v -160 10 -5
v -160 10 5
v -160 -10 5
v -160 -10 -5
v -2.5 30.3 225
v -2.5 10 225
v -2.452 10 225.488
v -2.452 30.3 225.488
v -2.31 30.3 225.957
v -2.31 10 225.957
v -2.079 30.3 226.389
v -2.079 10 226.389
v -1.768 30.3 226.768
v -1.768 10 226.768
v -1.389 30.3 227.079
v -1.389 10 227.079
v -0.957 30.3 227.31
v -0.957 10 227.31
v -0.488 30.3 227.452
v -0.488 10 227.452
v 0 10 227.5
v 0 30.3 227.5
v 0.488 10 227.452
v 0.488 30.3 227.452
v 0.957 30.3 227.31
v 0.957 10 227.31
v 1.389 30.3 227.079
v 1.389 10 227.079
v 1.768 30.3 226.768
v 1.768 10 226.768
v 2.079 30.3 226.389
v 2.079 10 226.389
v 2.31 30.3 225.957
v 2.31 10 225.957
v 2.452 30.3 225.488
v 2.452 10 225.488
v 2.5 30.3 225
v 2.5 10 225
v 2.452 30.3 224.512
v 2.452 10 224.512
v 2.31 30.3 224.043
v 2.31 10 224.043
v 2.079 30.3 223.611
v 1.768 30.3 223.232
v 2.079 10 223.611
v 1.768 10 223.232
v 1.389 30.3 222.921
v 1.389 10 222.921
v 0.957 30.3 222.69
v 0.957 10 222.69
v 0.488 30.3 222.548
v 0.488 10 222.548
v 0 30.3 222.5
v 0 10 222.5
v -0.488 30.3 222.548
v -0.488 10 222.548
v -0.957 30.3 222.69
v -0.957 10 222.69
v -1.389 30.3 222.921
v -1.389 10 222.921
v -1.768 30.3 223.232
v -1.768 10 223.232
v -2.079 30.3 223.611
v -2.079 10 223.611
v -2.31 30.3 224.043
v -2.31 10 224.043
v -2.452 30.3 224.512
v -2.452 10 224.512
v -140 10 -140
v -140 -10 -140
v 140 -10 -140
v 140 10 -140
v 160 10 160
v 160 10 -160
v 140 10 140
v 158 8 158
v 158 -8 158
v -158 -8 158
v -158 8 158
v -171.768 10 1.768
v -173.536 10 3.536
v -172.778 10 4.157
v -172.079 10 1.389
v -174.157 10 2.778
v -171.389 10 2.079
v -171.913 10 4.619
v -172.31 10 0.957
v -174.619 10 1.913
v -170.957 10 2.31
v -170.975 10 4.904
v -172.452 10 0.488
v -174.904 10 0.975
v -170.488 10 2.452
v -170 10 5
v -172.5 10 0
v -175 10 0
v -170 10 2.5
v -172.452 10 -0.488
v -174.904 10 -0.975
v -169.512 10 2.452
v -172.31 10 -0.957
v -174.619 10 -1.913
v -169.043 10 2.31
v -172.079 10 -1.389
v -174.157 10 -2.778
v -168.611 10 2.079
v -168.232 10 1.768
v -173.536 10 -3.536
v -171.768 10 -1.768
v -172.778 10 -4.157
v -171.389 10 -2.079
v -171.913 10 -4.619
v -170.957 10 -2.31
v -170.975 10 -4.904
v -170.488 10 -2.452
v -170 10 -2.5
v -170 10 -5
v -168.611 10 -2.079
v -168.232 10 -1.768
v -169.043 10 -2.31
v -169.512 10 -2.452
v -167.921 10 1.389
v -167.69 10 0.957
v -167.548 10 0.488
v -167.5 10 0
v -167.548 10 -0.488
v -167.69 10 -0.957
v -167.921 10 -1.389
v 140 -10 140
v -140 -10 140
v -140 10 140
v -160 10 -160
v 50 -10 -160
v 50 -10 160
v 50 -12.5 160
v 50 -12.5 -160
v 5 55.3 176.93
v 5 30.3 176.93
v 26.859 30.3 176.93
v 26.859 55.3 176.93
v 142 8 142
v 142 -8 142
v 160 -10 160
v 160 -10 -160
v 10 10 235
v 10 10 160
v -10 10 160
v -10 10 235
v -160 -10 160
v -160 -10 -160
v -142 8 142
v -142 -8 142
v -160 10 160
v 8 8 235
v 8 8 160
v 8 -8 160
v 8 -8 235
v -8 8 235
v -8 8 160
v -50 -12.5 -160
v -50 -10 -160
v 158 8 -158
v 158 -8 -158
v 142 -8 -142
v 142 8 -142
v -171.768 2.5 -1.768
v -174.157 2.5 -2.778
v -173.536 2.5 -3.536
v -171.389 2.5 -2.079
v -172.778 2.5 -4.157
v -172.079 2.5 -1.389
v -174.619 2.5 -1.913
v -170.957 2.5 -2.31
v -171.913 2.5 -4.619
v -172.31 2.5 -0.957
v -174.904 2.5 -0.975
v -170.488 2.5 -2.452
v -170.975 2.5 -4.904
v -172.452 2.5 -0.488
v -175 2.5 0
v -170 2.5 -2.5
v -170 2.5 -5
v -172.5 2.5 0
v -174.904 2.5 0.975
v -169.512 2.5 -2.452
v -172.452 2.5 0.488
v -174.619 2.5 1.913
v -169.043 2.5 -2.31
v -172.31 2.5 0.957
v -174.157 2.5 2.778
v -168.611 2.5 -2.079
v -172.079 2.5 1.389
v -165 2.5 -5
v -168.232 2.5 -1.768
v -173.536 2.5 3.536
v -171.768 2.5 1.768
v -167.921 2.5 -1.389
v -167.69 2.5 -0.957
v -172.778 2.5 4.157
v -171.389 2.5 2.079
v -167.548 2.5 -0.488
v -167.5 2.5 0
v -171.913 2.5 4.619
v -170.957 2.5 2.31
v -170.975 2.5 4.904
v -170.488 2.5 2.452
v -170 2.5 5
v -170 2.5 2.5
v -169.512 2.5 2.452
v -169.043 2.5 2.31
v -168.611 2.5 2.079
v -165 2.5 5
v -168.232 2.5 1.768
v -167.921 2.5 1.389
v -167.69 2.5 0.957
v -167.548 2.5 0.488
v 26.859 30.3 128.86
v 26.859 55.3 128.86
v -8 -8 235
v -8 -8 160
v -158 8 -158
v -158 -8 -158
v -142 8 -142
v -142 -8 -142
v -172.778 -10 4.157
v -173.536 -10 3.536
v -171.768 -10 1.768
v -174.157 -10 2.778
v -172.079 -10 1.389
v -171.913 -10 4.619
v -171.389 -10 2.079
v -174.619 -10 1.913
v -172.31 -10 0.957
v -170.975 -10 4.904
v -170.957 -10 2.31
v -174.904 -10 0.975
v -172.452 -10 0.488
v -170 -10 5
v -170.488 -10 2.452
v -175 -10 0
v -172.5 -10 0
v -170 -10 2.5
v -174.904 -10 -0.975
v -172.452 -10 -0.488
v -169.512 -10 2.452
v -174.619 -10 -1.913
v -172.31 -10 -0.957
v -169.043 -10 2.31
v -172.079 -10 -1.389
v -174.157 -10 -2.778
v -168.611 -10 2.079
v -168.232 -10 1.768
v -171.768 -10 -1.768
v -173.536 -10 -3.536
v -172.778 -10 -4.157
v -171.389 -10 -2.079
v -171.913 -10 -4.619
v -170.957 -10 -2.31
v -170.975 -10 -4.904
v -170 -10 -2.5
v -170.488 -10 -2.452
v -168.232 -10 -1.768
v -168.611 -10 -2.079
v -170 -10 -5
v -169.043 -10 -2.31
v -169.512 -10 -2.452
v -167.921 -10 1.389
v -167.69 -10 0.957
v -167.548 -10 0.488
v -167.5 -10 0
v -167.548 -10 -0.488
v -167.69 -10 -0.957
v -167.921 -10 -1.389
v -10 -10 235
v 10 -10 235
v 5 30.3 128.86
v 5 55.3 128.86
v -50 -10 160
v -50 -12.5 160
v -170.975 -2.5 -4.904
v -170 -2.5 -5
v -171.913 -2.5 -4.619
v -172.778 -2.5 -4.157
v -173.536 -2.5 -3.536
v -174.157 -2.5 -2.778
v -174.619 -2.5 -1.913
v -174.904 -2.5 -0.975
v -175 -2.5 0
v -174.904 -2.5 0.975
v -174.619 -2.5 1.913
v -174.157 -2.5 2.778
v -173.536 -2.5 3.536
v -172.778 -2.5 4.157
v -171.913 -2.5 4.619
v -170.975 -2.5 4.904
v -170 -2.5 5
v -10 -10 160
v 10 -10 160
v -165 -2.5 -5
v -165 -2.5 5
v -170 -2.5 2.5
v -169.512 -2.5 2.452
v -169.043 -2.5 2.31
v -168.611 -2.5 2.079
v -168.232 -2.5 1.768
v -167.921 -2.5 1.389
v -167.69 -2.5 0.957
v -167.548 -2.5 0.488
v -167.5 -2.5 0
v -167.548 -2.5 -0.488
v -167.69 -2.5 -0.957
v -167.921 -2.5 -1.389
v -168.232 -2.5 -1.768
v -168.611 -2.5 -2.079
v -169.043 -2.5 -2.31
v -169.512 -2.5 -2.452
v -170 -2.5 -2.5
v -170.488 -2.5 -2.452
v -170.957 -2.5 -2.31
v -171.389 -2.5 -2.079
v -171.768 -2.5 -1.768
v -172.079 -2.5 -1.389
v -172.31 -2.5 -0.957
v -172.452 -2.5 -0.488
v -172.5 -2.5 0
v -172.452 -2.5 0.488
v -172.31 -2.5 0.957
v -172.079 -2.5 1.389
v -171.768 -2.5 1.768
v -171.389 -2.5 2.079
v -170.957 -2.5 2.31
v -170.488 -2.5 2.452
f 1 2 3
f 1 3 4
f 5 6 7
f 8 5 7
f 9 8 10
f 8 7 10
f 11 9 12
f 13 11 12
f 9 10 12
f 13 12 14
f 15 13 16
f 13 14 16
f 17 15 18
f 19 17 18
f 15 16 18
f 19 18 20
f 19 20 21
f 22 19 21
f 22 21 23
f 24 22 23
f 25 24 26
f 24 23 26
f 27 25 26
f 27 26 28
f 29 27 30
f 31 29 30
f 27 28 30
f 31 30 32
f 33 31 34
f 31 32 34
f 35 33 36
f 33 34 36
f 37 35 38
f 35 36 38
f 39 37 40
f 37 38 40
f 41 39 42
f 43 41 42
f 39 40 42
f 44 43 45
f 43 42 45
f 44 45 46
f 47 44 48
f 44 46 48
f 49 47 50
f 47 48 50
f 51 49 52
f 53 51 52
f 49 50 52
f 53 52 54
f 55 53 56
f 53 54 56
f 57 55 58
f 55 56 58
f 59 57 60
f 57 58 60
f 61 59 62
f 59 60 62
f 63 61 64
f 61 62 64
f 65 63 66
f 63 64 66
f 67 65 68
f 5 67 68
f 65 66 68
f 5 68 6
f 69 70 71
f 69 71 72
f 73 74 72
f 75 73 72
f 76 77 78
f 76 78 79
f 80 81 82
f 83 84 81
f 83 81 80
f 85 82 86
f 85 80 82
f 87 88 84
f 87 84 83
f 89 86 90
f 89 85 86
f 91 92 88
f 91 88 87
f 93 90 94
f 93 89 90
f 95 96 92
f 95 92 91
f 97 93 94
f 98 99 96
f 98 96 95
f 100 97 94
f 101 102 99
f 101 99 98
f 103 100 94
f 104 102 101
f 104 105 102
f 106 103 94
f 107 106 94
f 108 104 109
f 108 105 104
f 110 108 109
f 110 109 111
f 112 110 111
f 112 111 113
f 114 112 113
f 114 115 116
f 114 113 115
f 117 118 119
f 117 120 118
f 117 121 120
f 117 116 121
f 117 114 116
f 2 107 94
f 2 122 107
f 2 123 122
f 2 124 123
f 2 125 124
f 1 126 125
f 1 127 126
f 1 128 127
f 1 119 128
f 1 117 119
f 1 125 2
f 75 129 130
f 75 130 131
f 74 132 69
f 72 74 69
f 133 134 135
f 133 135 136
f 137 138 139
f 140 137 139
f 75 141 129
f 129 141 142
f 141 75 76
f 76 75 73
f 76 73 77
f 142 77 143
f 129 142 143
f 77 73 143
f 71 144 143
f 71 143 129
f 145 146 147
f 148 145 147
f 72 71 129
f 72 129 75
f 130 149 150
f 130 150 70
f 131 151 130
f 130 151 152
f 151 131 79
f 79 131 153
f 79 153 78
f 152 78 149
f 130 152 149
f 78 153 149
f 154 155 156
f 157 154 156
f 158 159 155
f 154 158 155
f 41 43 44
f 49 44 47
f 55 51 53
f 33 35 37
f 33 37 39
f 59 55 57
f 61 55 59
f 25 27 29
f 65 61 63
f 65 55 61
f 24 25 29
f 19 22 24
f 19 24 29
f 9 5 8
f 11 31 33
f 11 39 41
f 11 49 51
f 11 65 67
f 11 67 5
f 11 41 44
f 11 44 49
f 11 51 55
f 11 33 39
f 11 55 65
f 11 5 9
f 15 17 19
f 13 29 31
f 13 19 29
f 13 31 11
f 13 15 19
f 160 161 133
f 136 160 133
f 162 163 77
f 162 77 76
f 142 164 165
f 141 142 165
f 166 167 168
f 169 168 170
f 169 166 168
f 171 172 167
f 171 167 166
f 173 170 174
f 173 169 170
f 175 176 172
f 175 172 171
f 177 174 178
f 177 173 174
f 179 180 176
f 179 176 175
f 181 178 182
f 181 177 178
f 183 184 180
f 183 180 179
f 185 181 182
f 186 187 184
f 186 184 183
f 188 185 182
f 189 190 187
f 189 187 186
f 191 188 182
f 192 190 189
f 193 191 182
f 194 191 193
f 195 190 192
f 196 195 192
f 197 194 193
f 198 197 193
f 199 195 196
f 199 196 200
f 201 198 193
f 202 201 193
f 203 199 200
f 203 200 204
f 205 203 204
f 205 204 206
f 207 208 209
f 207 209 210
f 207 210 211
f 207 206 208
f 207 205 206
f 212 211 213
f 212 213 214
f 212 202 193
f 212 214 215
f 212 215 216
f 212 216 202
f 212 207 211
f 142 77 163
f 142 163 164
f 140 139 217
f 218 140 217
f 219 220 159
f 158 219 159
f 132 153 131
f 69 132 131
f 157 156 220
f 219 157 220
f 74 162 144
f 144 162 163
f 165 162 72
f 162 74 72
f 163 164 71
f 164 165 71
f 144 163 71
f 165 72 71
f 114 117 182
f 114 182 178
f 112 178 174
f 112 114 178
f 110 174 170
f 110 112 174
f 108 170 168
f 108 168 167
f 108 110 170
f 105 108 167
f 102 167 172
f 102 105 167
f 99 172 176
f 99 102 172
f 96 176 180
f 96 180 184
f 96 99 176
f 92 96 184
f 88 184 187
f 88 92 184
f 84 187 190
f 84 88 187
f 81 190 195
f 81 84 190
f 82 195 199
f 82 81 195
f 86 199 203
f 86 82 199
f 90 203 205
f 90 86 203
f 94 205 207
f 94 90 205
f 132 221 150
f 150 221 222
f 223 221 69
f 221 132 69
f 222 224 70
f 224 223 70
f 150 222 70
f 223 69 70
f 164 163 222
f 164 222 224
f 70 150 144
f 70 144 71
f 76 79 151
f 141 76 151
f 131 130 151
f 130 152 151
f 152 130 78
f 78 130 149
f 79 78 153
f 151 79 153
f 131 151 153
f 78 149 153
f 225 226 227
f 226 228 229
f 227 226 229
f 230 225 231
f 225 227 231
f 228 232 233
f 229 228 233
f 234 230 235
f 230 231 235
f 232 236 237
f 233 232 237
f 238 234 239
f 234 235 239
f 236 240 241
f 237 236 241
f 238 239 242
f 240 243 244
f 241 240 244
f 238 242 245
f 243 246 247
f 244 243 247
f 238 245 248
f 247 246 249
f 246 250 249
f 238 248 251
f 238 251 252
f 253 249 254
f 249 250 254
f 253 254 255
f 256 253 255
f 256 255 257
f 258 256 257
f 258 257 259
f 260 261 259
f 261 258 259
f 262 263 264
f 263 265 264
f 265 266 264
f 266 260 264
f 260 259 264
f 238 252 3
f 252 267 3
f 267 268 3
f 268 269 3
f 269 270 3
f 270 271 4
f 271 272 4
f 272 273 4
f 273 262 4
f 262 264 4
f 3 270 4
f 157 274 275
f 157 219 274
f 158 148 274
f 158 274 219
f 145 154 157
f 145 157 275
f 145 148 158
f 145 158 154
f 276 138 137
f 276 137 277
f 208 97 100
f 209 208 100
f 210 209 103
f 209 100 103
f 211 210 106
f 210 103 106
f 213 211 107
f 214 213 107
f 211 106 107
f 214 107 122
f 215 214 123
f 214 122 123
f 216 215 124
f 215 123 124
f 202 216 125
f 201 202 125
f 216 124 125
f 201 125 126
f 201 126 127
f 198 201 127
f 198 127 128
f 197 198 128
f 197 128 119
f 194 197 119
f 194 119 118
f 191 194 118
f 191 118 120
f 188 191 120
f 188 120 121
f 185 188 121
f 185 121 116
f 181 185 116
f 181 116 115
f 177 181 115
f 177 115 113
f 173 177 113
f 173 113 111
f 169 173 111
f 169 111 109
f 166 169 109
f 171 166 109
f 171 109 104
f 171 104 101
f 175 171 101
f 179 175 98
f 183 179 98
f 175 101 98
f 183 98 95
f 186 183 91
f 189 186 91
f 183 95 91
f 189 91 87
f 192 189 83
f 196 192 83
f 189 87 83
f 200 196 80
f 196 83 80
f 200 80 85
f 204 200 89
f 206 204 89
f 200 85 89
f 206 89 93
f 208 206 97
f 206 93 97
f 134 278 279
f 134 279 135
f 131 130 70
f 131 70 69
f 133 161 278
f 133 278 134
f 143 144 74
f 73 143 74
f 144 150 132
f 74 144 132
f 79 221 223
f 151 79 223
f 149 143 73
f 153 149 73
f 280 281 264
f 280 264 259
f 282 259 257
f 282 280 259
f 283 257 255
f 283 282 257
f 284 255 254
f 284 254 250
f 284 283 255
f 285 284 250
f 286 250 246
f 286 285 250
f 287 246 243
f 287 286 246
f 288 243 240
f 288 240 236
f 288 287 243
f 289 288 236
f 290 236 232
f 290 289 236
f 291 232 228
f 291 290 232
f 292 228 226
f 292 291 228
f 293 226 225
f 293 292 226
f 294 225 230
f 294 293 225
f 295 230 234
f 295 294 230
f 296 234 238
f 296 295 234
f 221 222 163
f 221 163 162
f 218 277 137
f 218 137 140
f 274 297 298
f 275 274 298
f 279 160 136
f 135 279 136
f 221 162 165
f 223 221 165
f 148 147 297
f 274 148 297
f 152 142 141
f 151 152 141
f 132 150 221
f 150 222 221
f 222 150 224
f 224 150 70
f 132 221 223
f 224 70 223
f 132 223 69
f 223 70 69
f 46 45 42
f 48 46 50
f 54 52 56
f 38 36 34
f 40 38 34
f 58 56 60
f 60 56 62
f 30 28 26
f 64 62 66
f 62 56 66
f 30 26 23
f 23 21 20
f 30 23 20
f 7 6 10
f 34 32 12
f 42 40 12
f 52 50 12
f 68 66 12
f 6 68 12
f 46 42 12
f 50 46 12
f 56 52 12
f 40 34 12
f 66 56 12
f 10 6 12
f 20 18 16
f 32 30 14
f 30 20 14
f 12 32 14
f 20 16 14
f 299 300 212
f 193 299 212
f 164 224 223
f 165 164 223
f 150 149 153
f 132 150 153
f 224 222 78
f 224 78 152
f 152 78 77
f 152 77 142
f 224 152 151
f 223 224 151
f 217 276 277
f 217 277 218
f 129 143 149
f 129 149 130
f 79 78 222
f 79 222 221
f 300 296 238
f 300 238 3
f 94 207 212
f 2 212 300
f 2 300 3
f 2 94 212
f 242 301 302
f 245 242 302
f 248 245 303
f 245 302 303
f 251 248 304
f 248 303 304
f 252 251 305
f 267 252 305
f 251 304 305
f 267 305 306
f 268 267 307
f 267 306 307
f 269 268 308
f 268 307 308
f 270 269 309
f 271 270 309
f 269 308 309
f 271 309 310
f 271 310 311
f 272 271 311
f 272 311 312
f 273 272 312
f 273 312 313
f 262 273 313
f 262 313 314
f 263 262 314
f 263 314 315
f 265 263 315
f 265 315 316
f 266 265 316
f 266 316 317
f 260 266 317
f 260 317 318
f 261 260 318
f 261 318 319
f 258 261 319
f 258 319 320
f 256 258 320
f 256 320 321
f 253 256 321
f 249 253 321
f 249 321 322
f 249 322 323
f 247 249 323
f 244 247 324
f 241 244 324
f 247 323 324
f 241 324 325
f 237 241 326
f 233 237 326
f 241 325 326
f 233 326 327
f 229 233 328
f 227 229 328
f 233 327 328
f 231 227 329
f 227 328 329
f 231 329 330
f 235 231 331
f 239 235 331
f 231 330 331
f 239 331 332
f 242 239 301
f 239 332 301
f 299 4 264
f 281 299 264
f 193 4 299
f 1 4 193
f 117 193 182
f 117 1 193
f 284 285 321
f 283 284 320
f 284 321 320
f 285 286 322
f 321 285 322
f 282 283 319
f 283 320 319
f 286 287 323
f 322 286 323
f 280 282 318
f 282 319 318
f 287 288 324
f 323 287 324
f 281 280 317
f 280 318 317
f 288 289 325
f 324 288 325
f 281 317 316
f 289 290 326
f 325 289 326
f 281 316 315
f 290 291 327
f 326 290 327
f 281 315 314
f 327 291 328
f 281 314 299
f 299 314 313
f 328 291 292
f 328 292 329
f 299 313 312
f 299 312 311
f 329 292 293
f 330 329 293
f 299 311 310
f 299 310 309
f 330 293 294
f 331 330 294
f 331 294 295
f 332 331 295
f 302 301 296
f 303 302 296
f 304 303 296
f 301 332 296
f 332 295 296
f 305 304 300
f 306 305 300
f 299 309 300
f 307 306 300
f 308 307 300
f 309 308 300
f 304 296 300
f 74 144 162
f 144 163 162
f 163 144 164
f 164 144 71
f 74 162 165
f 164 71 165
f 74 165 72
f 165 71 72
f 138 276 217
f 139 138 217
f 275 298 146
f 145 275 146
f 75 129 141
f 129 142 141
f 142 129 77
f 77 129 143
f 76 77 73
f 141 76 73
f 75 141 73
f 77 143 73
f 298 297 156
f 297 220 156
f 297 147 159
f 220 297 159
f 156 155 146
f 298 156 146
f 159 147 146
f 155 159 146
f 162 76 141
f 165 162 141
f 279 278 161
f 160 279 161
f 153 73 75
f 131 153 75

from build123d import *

# Parameters (mm, degrees)
TUBO_CUADRADO_20_X_20_X_2_2_DEPTH      = 315.142135624
TUBO_CUADRADO_20_X_20_X_2_2_DEPTH_BACK = 15.142135624
SKETCH1_W                              = 20
SKETCH1_H                              = 20
SKETCH1_W_2                            = 16
SKETCH1_H_2                            = 16
SKETCH1_ON_SEGMENT_2_W                 = 20
SKETCH1_ON_SEGMENT_2_H                 = 20
SKETCH1_ON_SEGMENT_2_W_2               = 16
SKETCH1_ON_SEGMENT_2_H_2               = 16
TUBO_CUADRADO_20_X_20_X_2_2_2_DEPTH    = 330.284271247
SKETCH1_ON_SEGMENT_3_W                 = 20
SKETCH1_ON_SEGMENT_3_H                 = 20
SKETCH1_ON_SEGMENT_3_W_2               = 16
SKETCH1_ON_SEGMENT_3_H_2               = 16
TUBO_CUADRADO_20_X_20_X_2_2_3_DEPTH    = 330.284271247
SKETCH1_ON_SEGMENT_4_W                 = 20
SKETCH1_ON_SEGMENT_4_H                 = 20
SKETCH1_ON_SEGMENT_4_W_2               = 16
SKETCH1_ON_SEGMENT_4_H_2               = 16
TUBO_CUADRADO_20_X_20_X_2_2_4_DEPTH    = 330.284271247
CROQUIS3_W                             = 100
CROQUIS3_H                             = 320
SALIENTE_EXTRUIR1_DEPTH                = 2.5
CROQUIS7_R                             = 2.5
SALIENTE_EXTRUIR2_DEPTH                = 20
CROQUIS9_W                             = 12.514211711
CROQUIS9_H                             = 5
CORTAR_EXTRUIR1_DEPTH                  = 33
TUBO_CUADRADO_20_X_20_X_2_4_DEPTH      = 75
CROQUIS12_R                            = 2.5
SALIENTE_EXTRUIR3_DEPTH                = 20.3
CROQUIS13_W                            = 21.859399814
CROQUIS13_H                            = 48.070128995
SALIENTE_EXTRUIR4_DEPTH                = 25


with BuildPart() as part:
    # Sketch1 → Tubo cuadrado 20 X 20 X 2(2) (new, two sides: drawn at the far end of the back side and taken through both)
    with BuildSketch(Plane(origin=(-150, 0, -150), x_dir=(1, 0, 0), z_dir=(0, 0, 1)).offset(-TUBO_CUADRADO_20_X_20_X_2_2_DEPTH_BACK)):
        Rectangle(SKETCH1_W, SKETCH1_H)
        Rectangle(SKETCH1_W_2, SKETCH1_H_2, mode=Mode.SUBTRACT)
    extrude(amount=TUBO_CUADRADO_20_X_20_X_2_2_DEPTH + TUBO_CUADRADO_20_X_20_X_2_2_DEPTH_BACK)

    # Tubo cuadrado 20 X 20 X 2(2) mitre 1
    split(bisect_by=Plane(origin=(-150, 0, -150), x_dir=(0, -1, 0), z_dir=(-0.707106781, 0, 0.707106781)), keep=Keep.TOP)

    # Tubo cuadrado 20 X 20 X 2(2) mitre 2
    split(bisect_by=Plane(origin=(-150, 0, 150), x_dir=(0, -1, 0), z_dir=(-0.707106781, 0, -0.707106781)), keep=Keep.TOP)


with BuildPart() as body_2:
    # Sketch1 on segment 2 (carried to segment 2) → Tubo cuadrado 20 X 20 X 2_2 2 (new body)
    with BuildSketch(Plane(origin=(-165.142135624, 0, 150), x_dir=(0, 0, -1), z_dir=(1, 0, 0))):
        Rectangle(SKETCH1_ON_SEGMENT_2_W, SKETCH1_ON_SEGMENT_2_H)
        Rectangle(SKETCH1_ON_SEGMENT_2_W_2, SKETCH1_ON_SEGMENT_2_H_2, mode=Mode.SUBTRACT)
    extrude(amount=TUBO_CUADRADO_20_X_20_X_2_2_2_DEPTH)

    # Tubo cuadrado 20 X 20 X 2_2 2 mitre 1
    split(bisect_by=Plane(origin=(-150, 0, 150), x_dir=(0, 1, 0), z_dir=(0.707106781, 0, 0.707106781)), keep=Keep.TOP)

    # Tubo cuadrado 20 X 20 X 2_2 2 mitre 2
    split(bisect_by=Plane(origin=(150, 0, 150), x_dir=(0, -1, 0), z_dir=(-0.707106781, 0, 0.707106781)), keep=Keep.TOP)


with BuildPart() as body_3:
    # Sketch1 on segment 3 (carried to segment 3) → Tubo cuadrado 20 X 20 X 2_2 3 (new body)
    with BuildSketch(Plane(origin=(150, 0, 165.142135624), x_dir=(-1, 0, 0), z_dir=(0, 0, -1))):
        Rectangle(SKETCH1_ON_SEGMENT_3_W, SKETCH1_ON_SEGMENT_3_H)
        Rectangle(SKETCH1_ON_SEGMENT_3_W_2, SKETCH1_ON_SEGMENT_3_H_2, mode=Mode.SUBTRACT)
    extrude(amount=TUBO_CUADRADO_20_X_20_X_2_2_3_DEPTH)

    # Tubo cuadrado 20 X 20 X 2_2 3 mitre 1
    split(bisect_by=Plane(origin=(150, 0, -150), x_dir=(0, 1, 0), z_dir=(0.707106781, 0, 0.707106781)), keep=Keep.TOP)

    # Tubo cuadrado 20 X 20 X 2_2 3 mitre 2
    split(bisect_by=Plane(origin=(150, 0, 150), x_dir=(0, 1, 0), z_dir=(0.707106781, 0, -0.707106781)), keep=Keep.TOP)


with BuildPart() as body_4:
    # Sketch1 on segment 4 (carried to segment 4) → Tubo cuadrado 20 X 20 X 2_2 4 (new body)
    with BuildSketch(Plane(origin=(165.142135624, 0, -150), x_dir=(0, 0, 1), z_dir=(-1, 0, 0))):
        Rectangle(SKETCH1_ON_SEGMENT_4_W, SKETCH1_ON_SEGMENT_4_H)
        Rectangle(SKETCH1_ON_SEGMENT_4_W_2, SKETCH1_ON_SEGMENT_4_H_2, mode=Mode.SUBTRACT)
    extrude(amount=TUBO_CUADRADO_20_X_20_X_2_2_4_DEPTH)

    # Tubo cuadrado 20 X 20 X 2_2 4 mitre 1
    split(bisect_by=Plane(origin=(-150, 0, -150), x_dir=(0, 1, 0), z_dir=(0.707106781, 0, -0.707106781)), keep=Keep.TOP)

    # Tubo cuadrado 20 X 20 X 2_2 4 mitre 2
    split(bisect_by=Plane(origin=(150, 0, -150), x_dir=(0, -1, 0), z_dir=(-0.707106781, 0, -0.707106781)), keep=Keep.TOP)


with BuildPart() as body_5:
    # Croquis3 → Saliente-Extruir1 (new body)
    with BuildSketch(Plane(origin=(0, -10, 0), x_dir=(1, 0, 0), z_dir=(0, 1, 0))):
        Rectangle(CROQUIS3_W, CROQUIS3_H)
    extrude(amount=-SALIENTE_EXTRUIR1_DEPTH)


with BuildPart() as body_6:
    # Croquis7 → Saliente-Extruir2 (new body)
    with BuildSketch(Plane(origin=(0, 10, 0), x_dir=(1, 0, 0), z_dir=(0, 1, 0))):
        with BuildLine():
            Line((-160, 0), (-160, 5))
            Line((-160, 5), (-170, 5))
            ThreePointArc((-170, 5), (-175, 0), (-170, -5))
            Line((-170, -5), (-160, -5))
            Line((-160, -5), (-160, 0))
        make_face()
        with Locations(Location((-170, 0, 0), (0, 0, 270))):
            Circle(CROQUIS7_R, mode=Mode.SUBTRACT)
    extrude(amount=-SALIENTE_EXTRUIR2_DEPTH)

    # Croquis9 → Cortar-Extruir1 (cut)
    with BuildSketch(Plane.XY.offset(5)):
        with Locations((-171.257105856, 0)):
            Rectangle(CROQUIS9_W, CROQUIS9_H)
    extrude(amount=-CORTAR_EXTRUIR1_DEPTH, mode=Mode.SUBTRACT)


with BuildPart() as body_7:
    # Sketch11 → Tubo cuadrado 20 X 20 X 2(4) (new body)
    with BuildSketch(Plane.XY.offset(160)):
        Polygon((-6, -10), (6, -10), (10, -10), (10, -6), (10, 6), (10, 10), (6, 10), (-6, 10), (-10, 10), (-10, 6), (-10, -6), (-10, -10), align=None)
        Polygon((-6, -8), (6, -8), (8, -8), (8, -6), (8, 6), (8, 8), (6, 8), (-6, 8), (-8, 8), (-8, 6), (-8, -6), (-8, -8), align=None, mode=Mode.SUBTRACT)
    extrude(amount=TUBO_CUADRADO_20_X_20_X_2_4_DEPTH)


with BuildPart() as body_8:
    # Croquis12 → Saliente-Extruir3 (new body)
    with BuildSketch(Plane(origin=(0, 10, 0), x_dir=(1, 0, 0), z_dir=(0, 1, 0))):
        with Locations(Location((0, -225, 0), (0, 0, 180))):
            Circle(CROQUIS12_R)
    extrude(amount=SALIENTE_EXTRUIR3_DEPTH)


with BuildPart() as body_9:
    # Croquis13 → Saliente-Extruir4 (new body)
    with BuildSketch(Plane(origin=(0, 30.3, 0), x_dir=(1, 0, 0), z_dir=(0, 1, 0))):
        with Locations((15.929699907, -152.894806508)):
            Rectangle(CROQUIS13_W, CROQUIS13_H)
    extrude(amount=SALIENTE_EXTRUIR4_DEPTH)


solid = Compound([part.part, body_2.part, body_3.part, body_4.part, body_5.part, body_6.part, body_7.part, body_8.part, body_9.part])
